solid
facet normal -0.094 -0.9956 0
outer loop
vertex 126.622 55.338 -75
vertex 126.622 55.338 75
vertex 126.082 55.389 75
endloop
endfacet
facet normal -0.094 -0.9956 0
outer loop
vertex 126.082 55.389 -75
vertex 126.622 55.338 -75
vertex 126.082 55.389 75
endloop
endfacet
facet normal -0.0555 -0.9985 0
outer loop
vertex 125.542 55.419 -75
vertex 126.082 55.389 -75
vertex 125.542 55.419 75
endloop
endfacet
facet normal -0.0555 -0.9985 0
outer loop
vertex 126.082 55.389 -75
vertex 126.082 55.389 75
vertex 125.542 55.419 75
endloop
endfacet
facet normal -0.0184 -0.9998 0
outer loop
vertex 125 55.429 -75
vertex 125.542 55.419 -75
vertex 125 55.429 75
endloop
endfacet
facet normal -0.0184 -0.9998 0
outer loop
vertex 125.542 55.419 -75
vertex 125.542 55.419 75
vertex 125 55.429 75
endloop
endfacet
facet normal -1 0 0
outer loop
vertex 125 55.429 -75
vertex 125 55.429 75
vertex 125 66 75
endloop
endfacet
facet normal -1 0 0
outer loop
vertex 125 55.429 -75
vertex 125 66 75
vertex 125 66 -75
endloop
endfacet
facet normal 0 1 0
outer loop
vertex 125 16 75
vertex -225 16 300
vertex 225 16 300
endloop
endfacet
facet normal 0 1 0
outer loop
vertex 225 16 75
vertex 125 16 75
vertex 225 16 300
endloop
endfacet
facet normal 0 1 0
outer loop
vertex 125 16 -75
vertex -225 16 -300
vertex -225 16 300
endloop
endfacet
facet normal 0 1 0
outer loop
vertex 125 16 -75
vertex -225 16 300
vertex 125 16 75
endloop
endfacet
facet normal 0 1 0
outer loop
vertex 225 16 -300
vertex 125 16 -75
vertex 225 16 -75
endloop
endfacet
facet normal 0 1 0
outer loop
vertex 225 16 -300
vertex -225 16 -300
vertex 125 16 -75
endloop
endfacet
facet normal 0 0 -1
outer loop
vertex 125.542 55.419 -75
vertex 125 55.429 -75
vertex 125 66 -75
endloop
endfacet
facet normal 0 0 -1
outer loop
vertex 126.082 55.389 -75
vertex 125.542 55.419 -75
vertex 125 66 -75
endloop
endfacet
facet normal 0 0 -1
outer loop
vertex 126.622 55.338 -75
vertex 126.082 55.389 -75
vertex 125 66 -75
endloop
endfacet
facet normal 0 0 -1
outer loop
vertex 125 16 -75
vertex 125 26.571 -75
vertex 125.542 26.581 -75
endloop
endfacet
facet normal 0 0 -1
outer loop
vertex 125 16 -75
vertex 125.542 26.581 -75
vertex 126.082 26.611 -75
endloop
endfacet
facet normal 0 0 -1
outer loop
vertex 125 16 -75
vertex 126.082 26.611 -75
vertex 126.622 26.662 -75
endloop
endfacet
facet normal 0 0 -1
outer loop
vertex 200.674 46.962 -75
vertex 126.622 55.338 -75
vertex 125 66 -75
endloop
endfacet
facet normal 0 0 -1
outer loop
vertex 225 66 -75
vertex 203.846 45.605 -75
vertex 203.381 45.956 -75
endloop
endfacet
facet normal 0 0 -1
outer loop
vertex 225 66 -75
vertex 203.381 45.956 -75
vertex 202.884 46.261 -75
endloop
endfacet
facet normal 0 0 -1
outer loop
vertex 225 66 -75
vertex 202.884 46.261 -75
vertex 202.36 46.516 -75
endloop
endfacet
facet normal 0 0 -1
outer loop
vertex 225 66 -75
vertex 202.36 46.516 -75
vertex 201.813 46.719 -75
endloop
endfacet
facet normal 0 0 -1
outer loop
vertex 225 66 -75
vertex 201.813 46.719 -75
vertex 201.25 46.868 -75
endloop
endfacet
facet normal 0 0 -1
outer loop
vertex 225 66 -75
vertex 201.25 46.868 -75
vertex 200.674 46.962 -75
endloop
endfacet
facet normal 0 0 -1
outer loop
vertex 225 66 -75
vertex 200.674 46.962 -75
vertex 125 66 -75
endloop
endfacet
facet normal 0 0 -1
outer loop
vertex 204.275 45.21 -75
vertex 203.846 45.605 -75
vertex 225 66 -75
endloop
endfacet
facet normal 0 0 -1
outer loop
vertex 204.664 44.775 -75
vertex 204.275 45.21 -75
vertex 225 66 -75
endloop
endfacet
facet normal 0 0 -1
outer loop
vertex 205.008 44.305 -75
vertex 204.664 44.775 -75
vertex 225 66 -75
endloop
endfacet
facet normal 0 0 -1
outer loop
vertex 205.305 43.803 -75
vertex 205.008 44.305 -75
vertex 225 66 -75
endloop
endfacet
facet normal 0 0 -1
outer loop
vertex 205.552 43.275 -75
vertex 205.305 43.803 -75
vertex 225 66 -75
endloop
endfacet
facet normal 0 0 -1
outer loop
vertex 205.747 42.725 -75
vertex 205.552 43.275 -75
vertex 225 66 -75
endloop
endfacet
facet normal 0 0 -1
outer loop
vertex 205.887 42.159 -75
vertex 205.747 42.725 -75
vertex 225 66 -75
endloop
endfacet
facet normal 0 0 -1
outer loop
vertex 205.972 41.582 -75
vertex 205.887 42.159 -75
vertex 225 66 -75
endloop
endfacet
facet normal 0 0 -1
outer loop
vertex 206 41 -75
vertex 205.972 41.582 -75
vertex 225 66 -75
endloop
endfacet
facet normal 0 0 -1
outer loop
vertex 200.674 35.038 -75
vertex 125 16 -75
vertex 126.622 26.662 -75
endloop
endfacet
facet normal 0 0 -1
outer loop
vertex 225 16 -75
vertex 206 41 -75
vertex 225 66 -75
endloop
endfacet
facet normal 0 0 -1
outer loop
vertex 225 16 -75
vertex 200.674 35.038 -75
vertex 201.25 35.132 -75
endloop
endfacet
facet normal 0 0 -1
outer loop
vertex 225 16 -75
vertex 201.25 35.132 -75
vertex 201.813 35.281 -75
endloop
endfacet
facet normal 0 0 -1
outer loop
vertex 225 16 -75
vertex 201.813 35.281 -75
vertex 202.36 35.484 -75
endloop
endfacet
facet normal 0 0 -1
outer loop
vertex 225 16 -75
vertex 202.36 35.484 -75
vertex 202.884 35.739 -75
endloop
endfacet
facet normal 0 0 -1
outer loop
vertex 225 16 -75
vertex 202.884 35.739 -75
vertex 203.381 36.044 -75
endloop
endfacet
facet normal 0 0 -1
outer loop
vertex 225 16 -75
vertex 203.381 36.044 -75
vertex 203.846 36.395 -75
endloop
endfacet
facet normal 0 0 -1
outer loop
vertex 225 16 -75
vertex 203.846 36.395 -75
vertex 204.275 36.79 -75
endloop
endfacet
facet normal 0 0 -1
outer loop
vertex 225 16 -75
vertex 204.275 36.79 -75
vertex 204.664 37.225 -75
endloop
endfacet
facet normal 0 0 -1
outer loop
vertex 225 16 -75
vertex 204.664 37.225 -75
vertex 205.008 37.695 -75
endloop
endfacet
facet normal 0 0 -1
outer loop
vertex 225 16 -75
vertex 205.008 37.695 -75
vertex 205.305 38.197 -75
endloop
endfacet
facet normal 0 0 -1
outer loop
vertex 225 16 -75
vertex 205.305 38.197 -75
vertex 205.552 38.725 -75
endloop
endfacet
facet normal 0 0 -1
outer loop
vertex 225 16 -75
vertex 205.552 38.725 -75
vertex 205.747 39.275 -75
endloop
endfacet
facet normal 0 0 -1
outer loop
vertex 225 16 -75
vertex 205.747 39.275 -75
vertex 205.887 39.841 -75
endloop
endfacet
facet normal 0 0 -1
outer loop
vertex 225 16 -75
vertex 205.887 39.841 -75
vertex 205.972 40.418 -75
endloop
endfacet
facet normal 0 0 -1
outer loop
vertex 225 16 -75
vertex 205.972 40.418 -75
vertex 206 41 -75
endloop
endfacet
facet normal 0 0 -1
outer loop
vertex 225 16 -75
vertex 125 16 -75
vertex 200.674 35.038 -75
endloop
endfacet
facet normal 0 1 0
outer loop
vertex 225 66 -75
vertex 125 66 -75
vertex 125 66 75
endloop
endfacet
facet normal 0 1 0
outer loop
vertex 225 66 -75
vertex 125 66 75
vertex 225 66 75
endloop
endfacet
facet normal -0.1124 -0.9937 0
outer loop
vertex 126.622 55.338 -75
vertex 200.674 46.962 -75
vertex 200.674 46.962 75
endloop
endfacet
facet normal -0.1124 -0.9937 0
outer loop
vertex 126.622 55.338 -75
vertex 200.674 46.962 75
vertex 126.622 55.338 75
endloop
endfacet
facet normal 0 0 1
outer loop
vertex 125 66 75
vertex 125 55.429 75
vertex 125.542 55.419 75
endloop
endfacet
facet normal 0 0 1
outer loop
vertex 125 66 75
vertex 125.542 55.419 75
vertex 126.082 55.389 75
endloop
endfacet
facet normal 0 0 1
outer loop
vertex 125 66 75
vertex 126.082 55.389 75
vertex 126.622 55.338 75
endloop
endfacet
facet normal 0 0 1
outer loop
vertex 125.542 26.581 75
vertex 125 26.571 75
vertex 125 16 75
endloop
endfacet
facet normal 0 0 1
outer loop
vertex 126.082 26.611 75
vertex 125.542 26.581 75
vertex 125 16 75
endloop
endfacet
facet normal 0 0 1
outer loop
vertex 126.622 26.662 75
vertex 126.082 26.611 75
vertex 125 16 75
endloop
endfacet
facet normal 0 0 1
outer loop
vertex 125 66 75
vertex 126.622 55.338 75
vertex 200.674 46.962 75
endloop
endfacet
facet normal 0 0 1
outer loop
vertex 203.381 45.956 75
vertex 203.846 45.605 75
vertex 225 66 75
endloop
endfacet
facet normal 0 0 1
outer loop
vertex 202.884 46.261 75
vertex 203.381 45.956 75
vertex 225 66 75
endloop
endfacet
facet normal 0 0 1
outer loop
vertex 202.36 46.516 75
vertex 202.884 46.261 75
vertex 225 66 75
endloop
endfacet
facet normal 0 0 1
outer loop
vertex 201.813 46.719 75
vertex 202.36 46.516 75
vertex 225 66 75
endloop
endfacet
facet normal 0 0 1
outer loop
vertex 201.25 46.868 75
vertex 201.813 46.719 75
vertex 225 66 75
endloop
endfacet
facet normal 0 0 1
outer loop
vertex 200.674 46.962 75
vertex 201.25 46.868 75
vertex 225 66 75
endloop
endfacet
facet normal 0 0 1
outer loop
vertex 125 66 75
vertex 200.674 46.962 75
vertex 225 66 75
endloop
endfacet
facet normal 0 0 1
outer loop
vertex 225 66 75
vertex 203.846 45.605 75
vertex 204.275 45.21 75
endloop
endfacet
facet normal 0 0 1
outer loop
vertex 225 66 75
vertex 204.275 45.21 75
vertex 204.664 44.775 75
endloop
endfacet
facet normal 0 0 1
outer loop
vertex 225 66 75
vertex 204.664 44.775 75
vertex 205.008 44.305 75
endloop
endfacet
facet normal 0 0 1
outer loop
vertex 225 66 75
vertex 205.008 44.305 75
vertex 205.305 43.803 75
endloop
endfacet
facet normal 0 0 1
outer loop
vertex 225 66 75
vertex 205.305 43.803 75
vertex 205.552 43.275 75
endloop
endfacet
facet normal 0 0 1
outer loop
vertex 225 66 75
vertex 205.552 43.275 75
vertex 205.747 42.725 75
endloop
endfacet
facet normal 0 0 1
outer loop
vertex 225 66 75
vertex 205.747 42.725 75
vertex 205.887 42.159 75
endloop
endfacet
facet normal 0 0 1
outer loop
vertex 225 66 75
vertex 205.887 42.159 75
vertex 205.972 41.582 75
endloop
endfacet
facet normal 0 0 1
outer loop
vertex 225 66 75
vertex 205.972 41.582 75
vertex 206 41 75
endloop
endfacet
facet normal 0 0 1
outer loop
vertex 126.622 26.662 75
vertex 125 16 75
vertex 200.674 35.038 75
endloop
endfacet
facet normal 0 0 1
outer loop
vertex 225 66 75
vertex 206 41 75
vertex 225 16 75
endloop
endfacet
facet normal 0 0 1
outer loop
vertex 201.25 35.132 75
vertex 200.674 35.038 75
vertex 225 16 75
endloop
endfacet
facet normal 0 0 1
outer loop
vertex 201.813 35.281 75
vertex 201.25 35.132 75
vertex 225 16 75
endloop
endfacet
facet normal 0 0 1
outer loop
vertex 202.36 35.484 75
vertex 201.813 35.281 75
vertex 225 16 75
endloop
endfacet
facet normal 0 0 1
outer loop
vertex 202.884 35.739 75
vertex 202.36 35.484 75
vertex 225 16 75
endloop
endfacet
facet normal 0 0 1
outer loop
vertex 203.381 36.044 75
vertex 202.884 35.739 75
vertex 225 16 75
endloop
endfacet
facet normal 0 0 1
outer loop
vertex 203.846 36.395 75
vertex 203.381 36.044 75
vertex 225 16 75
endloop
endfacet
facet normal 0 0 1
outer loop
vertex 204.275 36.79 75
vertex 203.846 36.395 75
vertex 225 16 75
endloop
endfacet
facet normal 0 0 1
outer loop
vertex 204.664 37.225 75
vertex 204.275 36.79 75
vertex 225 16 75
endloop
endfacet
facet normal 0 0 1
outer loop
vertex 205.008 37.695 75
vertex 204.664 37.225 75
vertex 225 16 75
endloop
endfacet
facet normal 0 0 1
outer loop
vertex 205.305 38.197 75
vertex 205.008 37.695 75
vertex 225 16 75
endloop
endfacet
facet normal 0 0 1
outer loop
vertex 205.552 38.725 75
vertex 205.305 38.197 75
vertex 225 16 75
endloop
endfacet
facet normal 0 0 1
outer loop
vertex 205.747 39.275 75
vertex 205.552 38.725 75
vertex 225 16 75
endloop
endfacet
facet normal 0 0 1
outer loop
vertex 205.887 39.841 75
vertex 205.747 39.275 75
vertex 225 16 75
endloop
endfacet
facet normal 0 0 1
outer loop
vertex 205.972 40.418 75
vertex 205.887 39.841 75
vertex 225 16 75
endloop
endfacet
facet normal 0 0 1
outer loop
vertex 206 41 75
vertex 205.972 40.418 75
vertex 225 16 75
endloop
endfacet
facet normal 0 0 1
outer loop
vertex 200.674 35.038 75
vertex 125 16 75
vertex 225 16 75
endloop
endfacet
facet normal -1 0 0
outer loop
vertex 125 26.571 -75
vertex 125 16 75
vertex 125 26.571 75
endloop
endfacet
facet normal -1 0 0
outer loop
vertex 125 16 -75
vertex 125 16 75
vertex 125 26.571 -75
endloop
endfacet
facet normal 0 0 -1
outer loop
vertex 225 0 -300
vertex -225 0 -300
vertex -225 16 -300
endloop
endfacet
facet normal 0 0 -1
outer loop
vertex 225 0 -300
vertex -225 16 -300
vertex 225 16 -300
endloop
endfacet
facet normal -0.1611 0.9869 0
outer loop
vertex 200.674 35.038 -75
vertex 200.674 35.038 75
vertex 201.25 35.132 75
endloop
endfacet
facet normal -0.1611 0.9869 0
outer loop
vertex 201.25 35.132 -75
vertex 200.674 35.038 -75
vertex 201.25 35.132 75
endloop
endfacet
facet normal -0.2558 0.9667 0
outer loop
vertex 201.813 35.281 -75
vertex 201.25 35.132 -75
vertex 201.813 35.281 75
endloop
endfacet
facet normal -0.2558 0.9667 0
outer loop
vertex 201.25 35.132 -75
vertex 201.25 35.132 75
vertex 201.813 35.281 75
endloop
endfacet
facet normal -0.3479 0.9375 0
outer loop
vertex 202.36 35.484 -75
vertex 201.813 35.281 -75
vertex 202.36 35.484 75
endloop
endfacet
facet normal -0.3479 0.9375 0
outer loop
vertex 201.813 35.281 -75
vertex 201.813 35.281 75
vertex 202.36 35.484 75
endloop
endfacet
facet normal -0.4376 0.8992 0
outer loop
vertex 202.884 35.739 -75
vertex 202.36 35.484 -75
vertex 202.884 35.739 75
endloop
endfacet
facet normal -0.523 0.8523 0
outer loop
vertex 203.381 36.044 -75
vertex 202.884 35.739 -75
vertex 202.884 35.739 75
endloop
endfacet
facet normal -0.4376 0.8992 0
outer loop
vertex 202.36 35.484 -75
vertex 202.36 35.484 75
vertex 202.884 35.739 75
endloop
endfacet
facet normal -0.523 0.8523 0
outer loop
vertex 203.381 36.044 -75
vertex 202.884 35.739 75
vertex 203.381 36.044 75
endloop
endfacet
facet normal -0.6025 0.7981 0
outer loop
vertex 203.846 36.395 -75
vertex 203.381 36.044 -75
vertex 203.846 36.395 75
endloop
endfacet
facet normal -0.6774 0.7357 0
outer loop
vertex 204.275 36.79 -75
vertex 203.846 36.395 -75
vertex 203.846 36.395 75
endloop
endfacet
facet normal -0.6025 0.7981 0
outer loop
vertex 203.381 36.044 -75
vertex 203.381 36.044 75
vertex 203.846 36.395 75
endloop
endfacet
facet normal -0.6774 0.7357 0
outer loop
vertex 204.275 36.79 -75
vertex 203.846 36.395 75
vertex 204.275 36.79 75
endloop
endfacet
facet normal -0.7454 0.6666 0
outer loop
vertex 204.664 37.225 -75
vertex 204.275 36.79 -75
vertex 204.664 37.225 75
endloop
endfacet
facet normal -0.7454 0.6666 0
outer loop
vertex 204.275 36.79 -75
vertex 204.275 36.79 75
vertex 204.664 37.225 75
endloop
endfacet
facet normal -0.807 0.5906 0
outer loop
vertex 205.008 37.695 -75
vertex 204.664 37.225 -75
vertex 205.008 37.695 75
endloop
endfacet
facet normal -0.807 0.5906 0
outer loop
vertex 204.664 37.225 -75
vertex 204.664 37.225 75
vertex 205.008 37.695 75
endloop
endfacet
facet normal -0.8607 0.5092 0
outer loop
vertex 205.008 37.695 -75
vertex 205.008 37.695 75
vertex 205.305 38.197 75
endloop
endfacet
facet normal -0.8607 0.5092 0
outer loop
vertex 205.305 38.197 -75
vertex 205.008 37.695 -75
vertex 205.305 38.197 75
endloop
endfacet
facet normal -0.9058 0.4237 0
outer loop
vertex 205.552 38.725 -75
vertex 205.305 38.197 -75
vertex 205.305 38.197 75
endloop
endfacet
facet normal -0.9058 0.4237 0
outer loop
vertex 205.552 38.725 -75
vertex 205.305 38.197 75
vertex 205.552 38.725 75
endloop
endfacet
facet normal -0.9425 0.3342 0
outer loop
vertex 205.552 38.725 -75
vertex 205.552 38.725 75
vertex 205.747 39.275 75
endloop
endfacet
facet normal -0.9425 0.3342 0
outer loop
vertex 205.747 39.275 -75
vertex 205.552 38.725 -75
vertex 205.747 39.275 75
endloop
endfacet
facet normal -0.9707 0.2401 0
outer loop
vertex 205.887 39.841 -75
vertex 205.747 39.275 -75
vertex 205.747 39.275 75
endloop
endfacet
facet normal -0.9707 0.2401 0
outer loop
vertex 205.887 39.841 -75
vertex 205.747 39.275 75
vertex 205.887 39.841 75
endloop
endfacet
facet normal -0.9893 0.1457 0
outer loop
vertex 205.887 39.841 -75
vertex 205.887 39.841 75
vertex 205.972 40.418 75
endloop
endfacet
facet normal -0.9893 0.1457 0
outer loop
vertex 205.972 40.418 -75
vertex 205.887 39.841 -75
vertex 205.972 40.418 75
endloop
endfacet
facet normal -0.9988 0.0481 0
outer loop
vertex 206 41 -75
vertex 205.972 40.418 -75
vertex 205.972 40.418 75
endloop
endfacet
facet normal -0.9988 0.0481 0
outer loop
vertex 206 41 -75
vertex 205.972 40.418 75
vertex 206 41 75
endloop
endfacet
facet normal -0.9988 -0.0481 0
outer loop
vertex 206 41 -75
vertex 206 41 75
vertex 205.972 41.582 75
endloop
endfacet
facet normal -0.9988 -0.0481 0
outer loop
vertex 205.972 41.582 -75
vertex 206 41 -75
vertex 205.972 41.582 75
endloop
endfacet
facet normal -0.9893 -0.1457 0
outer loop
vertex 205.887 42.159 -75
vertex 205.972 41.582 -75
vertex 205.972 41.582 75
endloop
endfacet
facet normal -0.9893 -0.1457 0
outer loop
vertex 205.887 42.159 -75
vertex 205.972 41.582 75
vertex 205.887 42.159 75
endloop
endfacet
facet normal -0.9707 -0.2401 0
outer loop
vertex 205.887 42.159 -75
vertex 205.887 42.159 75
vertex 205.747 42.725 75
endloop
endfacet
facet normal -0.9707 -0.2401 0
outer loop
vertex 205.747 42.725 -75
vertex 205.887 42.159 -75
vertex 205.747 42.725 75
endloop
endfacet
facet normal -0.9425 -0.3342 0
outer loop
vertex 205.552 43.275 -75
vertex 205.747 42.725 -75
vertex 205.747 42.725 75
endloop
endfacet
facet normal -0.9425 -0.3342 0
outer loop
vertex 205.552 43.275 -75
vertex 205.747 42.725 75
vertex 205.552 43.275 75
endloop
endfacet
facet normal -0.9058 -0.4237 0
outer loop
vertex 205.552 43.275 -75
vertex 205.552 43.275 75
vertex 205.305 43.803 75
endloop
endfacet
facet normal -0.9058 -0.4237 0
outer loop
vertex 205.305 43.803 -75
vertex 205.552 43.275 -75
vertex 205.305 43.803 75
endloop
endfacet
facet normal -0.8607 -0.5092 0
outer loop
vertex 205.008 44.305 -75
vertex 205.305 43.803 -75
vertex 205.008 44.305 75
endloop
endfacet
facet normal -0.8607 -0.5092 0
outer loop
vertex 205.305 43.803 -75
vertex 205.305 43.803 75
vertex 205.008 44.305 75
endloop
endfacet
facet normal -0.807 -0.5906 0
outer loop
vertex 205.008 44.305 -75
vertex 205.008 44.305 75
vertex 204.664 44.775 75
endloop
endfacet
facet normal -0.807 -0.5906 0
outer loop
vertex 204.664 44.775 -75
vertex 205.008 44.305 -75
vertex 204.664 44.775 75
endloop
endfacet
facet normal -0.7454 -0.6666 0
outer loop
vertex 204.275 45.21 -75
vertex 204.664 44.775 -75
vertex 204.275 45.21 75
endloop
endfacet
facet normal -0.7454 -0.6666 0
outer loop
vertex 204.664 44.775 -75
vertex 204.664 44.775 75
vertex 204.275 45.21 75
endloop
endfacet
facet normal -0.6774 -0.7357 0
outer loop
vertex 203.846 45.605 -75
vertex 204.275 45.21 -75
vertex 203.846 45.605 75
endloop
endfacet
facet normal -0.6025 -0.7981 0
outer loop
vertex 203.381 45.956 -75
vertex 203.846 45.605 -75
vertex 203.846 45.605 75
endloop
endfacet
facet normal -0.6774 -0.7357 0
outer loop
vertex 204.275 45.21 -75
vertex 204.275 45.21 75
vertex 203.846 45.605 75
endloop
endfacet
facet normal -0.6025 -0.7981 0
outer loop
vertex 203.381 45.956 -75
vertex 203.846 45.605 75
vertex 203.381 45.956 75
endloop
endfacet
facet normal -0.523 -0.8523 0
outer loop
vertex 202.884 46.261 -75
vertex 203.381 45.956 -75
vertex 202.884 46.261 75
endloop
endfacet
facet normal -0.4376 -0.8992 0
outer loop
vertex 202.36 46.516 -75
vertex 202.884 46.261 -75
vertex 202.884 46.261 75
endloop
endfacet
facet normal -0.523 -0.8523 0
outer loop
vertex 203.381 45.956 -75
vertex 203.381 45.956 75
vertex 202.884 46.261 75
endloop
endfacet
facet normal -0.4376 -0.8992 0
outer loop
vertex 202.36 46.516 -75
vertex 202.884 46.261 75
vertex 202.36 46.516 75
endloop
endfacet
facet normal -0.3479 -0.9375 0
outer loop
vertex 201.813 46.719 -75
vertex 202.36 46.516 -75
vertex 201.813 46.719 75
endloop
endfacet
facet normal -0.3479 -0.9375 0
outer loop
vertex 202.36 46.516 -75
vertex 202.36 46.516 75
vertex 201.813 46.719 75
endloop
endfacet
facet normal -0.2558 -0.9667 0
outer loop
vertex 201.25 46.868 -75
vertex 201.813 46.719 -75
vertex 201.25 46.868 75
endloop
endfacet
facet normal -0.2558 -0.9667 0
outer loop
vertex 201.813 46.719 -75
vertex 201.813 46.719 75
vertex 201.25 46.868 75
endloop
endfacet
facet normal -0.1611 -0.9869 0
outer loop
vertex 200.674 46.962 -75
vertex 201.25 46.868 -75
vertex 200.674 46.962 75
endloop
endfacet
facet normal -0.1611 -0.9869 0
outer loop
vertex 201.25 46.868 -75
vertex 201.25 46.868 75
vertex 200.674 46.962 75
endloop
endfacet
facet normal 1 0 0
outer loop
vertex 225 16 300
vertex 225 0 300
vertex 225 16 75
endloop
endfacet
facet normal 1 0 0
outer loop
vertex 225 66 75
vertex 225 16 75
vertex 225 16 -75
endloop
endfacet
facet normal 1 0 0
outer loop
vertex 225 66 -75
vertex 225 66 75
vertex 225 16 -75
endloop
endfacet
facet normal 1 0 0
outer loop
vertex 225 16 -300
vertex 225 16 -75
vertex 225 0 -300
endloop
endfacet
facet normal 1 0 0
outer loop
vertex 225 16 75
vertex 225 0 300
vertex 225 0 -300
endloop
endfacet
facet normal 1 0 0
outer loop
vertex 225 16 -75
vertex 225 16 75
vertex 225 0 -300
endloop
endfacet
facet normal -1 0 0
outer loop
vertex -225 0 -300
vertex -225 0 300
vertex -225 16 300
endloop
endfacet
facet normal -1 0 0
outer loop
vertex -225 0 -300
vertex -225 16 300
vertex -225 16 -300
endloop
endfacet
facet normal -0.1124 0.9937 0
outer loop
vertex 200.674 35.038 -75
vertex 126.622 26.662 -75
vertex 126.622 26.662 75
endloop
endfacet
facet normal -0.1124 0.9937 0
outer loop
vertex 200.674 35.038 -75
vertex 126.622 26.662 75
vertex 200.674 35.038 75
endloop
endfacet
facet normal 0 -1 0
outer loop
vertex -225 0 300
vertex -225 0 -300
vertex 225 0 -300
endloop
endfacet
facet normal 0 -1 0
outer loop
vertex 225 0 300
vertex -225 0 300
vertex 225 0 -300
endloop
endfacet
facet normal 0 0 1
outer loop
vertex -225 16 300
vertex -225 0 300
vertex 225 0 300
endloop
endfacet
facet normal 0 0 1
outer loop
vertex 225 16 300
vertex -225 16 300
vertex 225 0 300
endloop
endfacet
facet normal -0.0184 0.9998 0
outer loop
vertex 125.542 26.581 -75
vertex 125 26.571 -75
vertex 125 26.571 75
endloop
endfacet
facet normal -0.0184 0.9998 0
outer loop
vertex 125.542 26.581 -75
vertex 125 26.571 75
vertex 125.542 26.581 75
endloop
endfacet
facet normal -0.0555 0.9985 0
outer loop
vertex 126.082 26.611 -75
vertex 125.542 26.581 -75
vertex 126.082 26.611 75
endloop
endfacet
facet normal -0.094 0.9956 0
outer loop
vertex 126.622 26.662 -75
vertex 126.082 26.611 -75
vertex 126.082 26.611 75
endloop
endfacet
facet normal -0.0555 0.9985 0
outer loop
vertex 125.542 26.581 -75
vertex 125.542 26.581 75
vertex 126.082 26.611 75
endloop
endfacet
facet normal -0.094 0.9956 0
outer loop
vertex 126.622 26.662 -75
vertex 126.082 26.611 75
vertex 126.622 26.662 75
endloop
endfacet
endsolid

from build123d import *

# Parameters (mm, degrees)
SKETCH1_W               = 450
SKETCH1_H               = 600
BOSS_EXTRUDE1_DEPTH     = 16
SKETCH2_W               = 100
SKETCH2_H               = 150
BOSS_EXTRUDE2_DEPTH     = 50
CUT_EXTRUDE1_DEPTH      = 443.273670932
CUT_EXTRUDE1_DEPTH_BACK = 443.273670932


with BuildPart() as part:
    # Sketch1 → Boss-Extrude1 (new body)
    with BuildSketch(Plane(origin=(0, 0, 0), x_dir=(1, 0, 0), z_dir=(0, 1, 0))):
        Rectangle(SKETCH1_W, SKETCH1_H)
    extrude(amount=BOSS_EXTRUDE1_DEPTH)

    # Sketch2 → Boss-Extrude2 (add)
    with BuildSketch(Plane(origin=(0, 16, 0), x_dir=(1, 0, 0), z_dir=(0, 1, 0))):
        with Locations((175, 0)):
            Rectangle(SKETCH2_W, SKETCH2_H)
    extrude(amount=BOSS_EXTRUDE2_DEPTH)

    # Sketch3 → Cut-Extrude1 (cut, two sides: drawn at the far end of the back side and taken through both)
    with BuildSketch(Plane(origin=(0, 0, -75), x_dir=(-1, 0, 0), z_dir=(0, 0, -1)).offset(-CUT_EXTRUDE1_DEPTH_BACK)):
        with BuildLine():
            Line((-200.674344807, 46.961984492), (-126.621721722, 55.337887164))
            ThreePointArc((-126.621721722, 55.337887164), (-110.57068991, 41), (-126.621721722, 26.662112836))
            Line((-126.621721722, 26.662112836), (-200.674344807, 35.038015508))
            ThreePointArc((-200.674344807, 35.038015508), (-206, 41), (-200.674344807, 46.961984492))
        make_face()
    extrude(amount=CUT_EXTRUDE1_DEPTH + CUT_EXTRUDE1_DEPTH_BACK, mode=Mode.SUBTRACT)


solid = part.part
